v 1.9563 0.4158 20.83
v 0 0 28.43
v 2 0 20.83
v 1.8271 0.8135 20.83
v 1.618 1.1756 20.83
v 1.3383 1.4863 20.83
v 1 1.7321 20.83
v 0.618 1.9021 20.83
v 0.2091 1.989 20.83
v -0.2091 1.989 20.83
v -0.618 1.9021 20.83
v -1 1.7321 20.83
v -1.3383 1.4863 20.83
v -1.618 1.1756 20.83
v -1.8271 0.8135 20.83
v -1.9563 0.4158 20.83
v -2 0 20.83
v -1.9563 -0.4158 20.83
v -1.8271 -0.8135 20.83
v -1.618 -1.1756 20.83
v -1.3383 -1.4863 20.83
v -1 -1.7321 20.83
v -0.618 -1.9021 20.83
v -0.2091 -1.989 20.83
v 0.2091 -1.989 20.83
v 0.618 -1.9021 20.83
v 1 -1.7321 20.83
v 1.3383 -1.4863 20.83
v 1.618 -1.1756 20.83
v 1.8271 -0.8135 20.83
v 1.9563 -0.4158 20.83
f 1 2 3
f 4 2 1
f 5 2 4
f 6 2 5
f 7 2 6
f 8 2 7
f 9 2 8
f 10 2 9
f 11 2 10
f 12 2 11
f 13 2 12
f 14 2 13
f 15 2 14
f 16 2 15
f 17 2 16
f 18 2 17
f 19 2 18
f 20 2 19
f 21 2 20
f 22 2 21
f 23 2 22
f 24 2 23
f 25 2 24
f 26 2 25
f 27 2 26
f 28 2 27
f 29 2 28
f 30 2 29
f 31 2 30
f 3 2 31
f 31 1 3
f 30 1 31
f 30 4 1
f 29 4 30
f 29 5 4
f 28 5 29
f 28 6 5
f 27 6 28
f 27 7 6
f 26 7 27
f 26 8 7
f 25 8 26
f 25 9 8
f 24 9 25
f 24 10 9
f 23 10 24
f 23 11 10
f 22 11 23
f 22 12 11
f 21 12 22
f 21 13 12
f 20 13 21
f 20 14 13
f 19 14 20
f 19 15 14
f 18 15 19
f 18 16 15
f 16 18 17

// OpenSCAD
module mount_holes(){                   import("./master.dxf", layer="mount_holes");}
module mount_holes_standoffs(){         import("./master.dxf", layer="mount_holes_standoffs");}
module switch_holes(){                  import("./master.dxf", layer="switch_holes");}
module pcb_footprint_sharp(){           import("./master.dxf", layer="pcb_footprint_sharp");}
module pcb_footprint_offset_notched(){  import("./master.dxf", layer="pcb_footprint_offset_notched");}
module pcb_footprint_offset(){          import("./master.dxf", layer="pcb_footprint_offset", $fn=30);}
module mcu_hole(){                      import("./master.dxf", layer="mcu_hole_offset");}
module mcu_cover(){                      import("./master.dxf", layer="mcu_cover");}
module screw_holes(){                   import("./master.dxf", layer="screw_holes");}
module screw_head_holes(){              import("./master.dxf", layer="screw_head_holes");}
module thumb_edge(){                    import("./master.dxf", layer="thumb_edge");}
module thumb_cutout(){                  import("./master.dxf", layer="thumb_cutout");}
module bevel_high(){                    import("./master.dxf", layer="bevel_high");}
module bevel_low(){                     import("./master.dxf", layer="bevel_low");}
module bevel_join(){                    import("./master.dxf", layer="bevel_join");}
module thumb_join(){                    import("./master.dxf", layer="thumb_join");}

weight_thickness = 2; // can actually accommodate more than 2mm bc of spacers
weight_cutout_depth = 1.5;

plate_thickness = 3;
spacer_height = 7;   // metal pin height on sandwich style cases
spacer_support_height = 3;
spacer_support_wall_thickness = 1.5;

bevel_thickness = 8;
small_lip = 3;
big_lip = 10;

notched_lower_amount = 0;

// Manually change above lip height
above_plate_lip_height = 3; 

screw_cap_height = 3;
screw_thread_height = 8;

mcu_x_offset = 133.93;
mcu_y_offset = 84.57;
mcu_usb_center = 9.2; // subtract from mcu_x_offset
mcu_usb_width = 12;
mcu_trs_center = 48.6; // subtract from mcu_y_offset
mcu_trs_width = 12;

thumb_left_x_offset = 67.42299;
thumb_left_y_offset = 12.14371;
thumb_right_x_offset = 134.28646;
thumb_right_y_offset = 22.00477;
thumb_right_angle = 45;

switch_hole_offset = 0.0;

// Use this to test switch hole tolerances
*difference(){
    translate([0,66,0]) cube([19,19,plate_thickness]);
    translate([0,0,-0.01]) 
            linear_extrude(plate_thickness+0.1)
            offset(switch_hole_offset)
            switch_holes();
}

echo("TOTAL HEIGHT MM:", bevel_thickness+spacer_height+plate_thickness);
// translate([0,0,-bevel_thickness/2]) cube([5,5,bevel_thickness+spacer_height+plate_thickness]);

// $fn = 60;
// !union(){
//     difference(){
//         rotate_extrude()
//             bevel_high();
//         translate([0,-10,0]) cube([20,20,20]);
//     }
//     translate([0,0,0]) rotate_extrude()
//         bevel_join();
//     translate([10,0,0]) rotate_extrude()
//         bevel_low();
// }


// testing stuff
*minkowski(){
    $fn = 60;

    union(){
        difference(){
            union(){
                    // top
                    rotate_extrude()
                        bevel_high();
                    // bottom
                    rotate([180,0,0])
                        rotate_extrude()
                        bevel_high();
            }
            translate([0,-50,-50]) 
                cube([100,100,100]);
        }
    }

    difference(){
        cube([100,100,100]);

        union(){
            translate([0,0,150])
                rotate([0,45,0])
                cube([100,100,100]);    
        }
        translate([71-0.3,0,80-0.7])
            rotate([0,0,0])
            cube([100,100,100]);
    }
}

*difference(){
    minkowski(){
        rotate([180,0,0])
            rotate_extrude()
            bevel_high();
        linear_extrude(spacer_height+plate_thickness+above_plate_lip_height+2)
            thumb_cutout();
    }
    translate([0,0,10])
        minkowski(){
            rotate([180,0,0])
                rotate_extrude()
                bevel_high();
            linear_extrude(spacer_height+plate_thickness+above_plate_lip_height+2)
                offset(-10)
                thumb_cutout();
        }
}


module body(){
        module main_body(rot){
            minkowski(){
                difference(){
                    union(){
                        // top
                        rotate_extrude()
                            bevel_high();
                        // bottom
                        rotate([180,0,0])
                            rotate_extrude()
                            bevel_high();
                    }

                    // yeah, gcal freaks out and this seems to fix it
                    rotate([0,0,rot ? 180+60+0.001 : 0])
                    translate([0,-50,-50])
                        cube([100,100,100]);
                }

                difference(){
                    difference(){
                        linear_extrude(spacer_height+plate_thickness+above_plate_lip_height+0.001) 
                            pcb_footprint_sharp();
                        // cut away thumb area
                        *translate([0,0,-1])
                            linear_extrude(spacer_height+plate_thickness+above_plate_lip_height+2)
                            thumb_cutout();
                        
                        // cut away a bit of the main body so that a nice transition can happen
                        minkowski(){
                            cylinder(4, 0,10);

                            translate([0,0,spacer_height+plate_thickness])
                                linear_extrude(spacer_height+plate_thickness+above_plate_lip_height+2)
                                offset(-10)
                                thumb_cutout();
                        }
                    }

                    translate([100,0,-5])
                        rotate([0,0,20])
                        translate([rot ? -200 : 0,-50,0])
                        cube([200,200,200]);
                }
            }
        }

    difference(){
        union(){
                // left
                main_body(false);
                // right
                main_body(true);
        }

        // // Thumb cluster bevel cutout
        // #translate([66.66+4.6, 13.61, 10+spacer_height+plate_thickness-1]) // for wide cylinder
        *translate([66.66+4.6, 13.61, spacer_height+plate_thickness+3])  // for square
            rotate([90, 0, 36])
            translate([-4.6,0,-3]) // no idea what this was
            linear_extrude(100)
            // hull(){
            //     translate([50, 0, 0]) circle(d=10);
            //     circle(d=10);
            // }
            square([60,10]);

        *translate([0,0,spacer_height+plate_thickness*2])
                    linear_extrude(spacer_height+plate_thickness)
                    thumb_cutout();
    }
    
    

    *minkowski(){
        union(){
            // top
            // cylinder(bevel_thickness/4, big_lip, small_lip);
            // bottom
            
            translate([0,0,-bevel_thickness/2]) cylinder(bevel_thickness/2, small_lip, big_lip);
        }
        intersection(){
            translate([66.66, -70, -25])
                cube([100,100,50]);
            linear_extrude(spacer_height+plate_thickness+above_plate_lip_height+0.001) 
                pcb_footprint_sharp();
        }
    }

    // Thumb cluster bevel
    minkowski(){
        union(){
            // top
            rotate_extrude()
                bevel_low();
            // cylinder(bevel_thickness/4, big_lip, small_lip);
            // bottom
            rotate([180,0,0])
                    rotate_extrude()
                    bevel_high();
            // translate([0,0,-bevel_thickness/2]) cylinder(bevel_thickness/2, small_lip, big_lip);
        }
        linear_extrude(spacer_height+plate_thickness+above_plate_lip_height+0.001)
            thumb_edge();
    }

    // // Thumb cluster bevel smoothing/ramps
    //     translate([thumb_left_x_offset+14,thumb_left_y_offset+1.4, spacer_height+plate_thickness*2-2.5])
    //         rotate([90, 0, -90])
    //         rotate([-10,0,0])
    //         linear_extrude(15)
    //         bevel_high();
}

module pro_micro(){
    translate([mcu_x_offset-18, mcu_y_offset-33.3, spacer_height])
        cube([18, 33.3, 2]);
    translate([mcu_x_offset-18+9-4, mcu_y_offset-10+2, spacer_height-2])
        cube([8, 10, 2]);
}
// #pro_micro();

module cutout_weight(){
    translate([0,0,-bevel_thickness/2+plate_thickness - weight_cutout_depth])
        linear_extrude(weight_thickness)
        // Solo mode here to export the weight plate (ctrl+f projection, slice)
        difference(){
            offset(-1)
                pcb_footprint_offset();
        
            offset(1)
                spacers2D();
        }
}

module cutouts(){
    module cable_cutout(width, height, extrude_amount=big_lip){
        linear_extrude(extrude_amount+0.1)
            minkowski(){
                circle(d=2);
                translate([1,1,0]) square([width-1, height-1]);
            }
    }

    union(){
        // Above plate
        translate([0,0,-bevel_thickness/2+plate_thickness*2+spacer_height+0.01])
            linear_extrude(above_plate_lip_height+bevel_thickness-plate_thickness+0.02)
                pcb_footprint_offset_notched();
        // Below plate
        translate([0,0,-bevel_thickness/2+plate_thickness])
            linear_extrude(spacer_height)
            pcb_footprint_offset();
        // Metal weight pocket
        cutout_weight();
        // Switch holes
        translate([0,0,-bevel_thickness/2+spacer_height+plate_thickness-0.01]) 
            linear_extrude(plate_thickness+0.1)
            offset(switch_hole_offset)
            switch_holes();
        // MCU plate hole
        translate([0,0,-bevel_thickness/2+spacer_height+plate_thickness-0.01]) linear_extrude(plate_thickness+0.1) mcu_hole();
        // Screws
        union(){
            // Cap
            translate([0,0,-bevel_thickness/2-0.1]) linear_extrude(bevel_thickness/2+screw_cap_height+0.1) screw_head_holes();
            translate([0,0,-bevel_thickness/2+bevel_thickness/2+screw_cap_height-0.01]) linear_extrude(screw_thread_height) screw_holes();
        }
        // MCU USB hole
        translate([mcu_x_offset-mcu_usb_center-mcu_usb_width/2-1, big_lip+mcu_y_offset+big_lip+0.01, 1-0.4]) 
            rotate([90,0,0])
            cable_cutout(mcu_usb_width+1, spacer_height+plate_thickness*2-1-1, big_lip*2);
        // MCU TRS hole
        translate([mcu_x_offset, mcu_y_offset-mcu_trs_center-mcu_trs_width/2+0.01, 0.5]) 
            rotate([90,0,90])
            cable_cutout(mcu_usb_width-1, spacer_height+plate_thickness);

        // translate([thumb_left_x_offset-0.3, thumb_left_y_offset-1.63-5, spacer_height+plate_thickness*2+4])
        //     rotate([0,18.525,0])
        //     cube([7.865,10,30]);
    }
}

module spacers2D(){
    offset(r=spacer_support_wall_thickness)
        mount_holes_standoffs();
}

module standoffs(){
    union(){
        // Standoff/alignment pins
        translate([0,0,-bevel_thickness/2+plate_thickness])
            linear_extrude(spacer_height)
            mount_holes_standoffs();
        
        // Spacers (PCB sits on this)
        translate([0,0,-bevel_thickness/2+plate_thickness]) 
            linear_extrude(spacer_support_height)
            spacers2D();
    }

}

module main(){
    difference(){
        body();
        cutouts();
    }

    // integrate the oled cover
    // it should probably have its own thickness value but using plate_thickness
    // since it's 3mm seems fine
    translate([0,0,bevel_thickness+plate_thickness*2]) 
        linear_extrude(plate_thickness)
        mcu_cover();

}

module block(){
    translate([-20,-15,spacer_height-1.01]) cube([200, 120, 100]);
}

module preview(){
    translate([0,0,bevel_thickness/2])
    difference(){
        union(){
            main();
            standoffs();
        }

        // Cut away front section to check thicknesses etc
        // translate([-200,-70,-50]) cube([400, 100, 100]);

        // Cut away top section
        // translate([-200,-50,spacer_height+plate_thickness+0.9]) cube([400, 200, 100]);
    }

    // Caps
    color("#333333") translate([0,0, spacer_height+plate_thickness-1+7.83 + bevel_thickness/2]) minkowski(){
        linear_extrude(0.001)
            switch_holes();

        cylinder(7.6, 2, 0);
    }
}

should_mirror = false;
preview_mode = true;
if (preview_mode == true){
    $fn = 30;

    if (should_mirror == true) {
        translate([-150,0,0]) preview();
        translate([150,0,0]) mirror([1,0,0]) preview();
    } else {
        difference(){
            preview();
            // translate([90,-200,-50]) cube([400, 400, 100]);
        }
    }
} else {
    $fn = 10;

    difference(){
        union(){
            // Bottom left
            translate([-150,0,0]) color("#999999") translate([0,0,bevel_thickness/2]) union(){
                difference(){
                    main();
                    block();
                }
                
                standoffs();
            }

            // Bottom right
            translate([150,0,0]) mirror([1,0,0]) color("#999999") translate([0,0,bevel_thickness/2]) union(){
                difference(){
                    main();
                    block();
                }
                
                standoffs();
            }

            // Top left
            // No idea why it's off by 1
            translate([-150,0,0]) color("#444444") translate([130,0,-spacer_height+1]) rotate([0,0,180]) intersection(){
                main();
                block();
            }

            // Top right
            translate([150,0,0]) mirror([1,0,0]) color("#444444") translate([130,0,-spacer_height+1]) rotate([0,0,180]) intersection(){
                main();
                block();
            }
        }
    }
}
